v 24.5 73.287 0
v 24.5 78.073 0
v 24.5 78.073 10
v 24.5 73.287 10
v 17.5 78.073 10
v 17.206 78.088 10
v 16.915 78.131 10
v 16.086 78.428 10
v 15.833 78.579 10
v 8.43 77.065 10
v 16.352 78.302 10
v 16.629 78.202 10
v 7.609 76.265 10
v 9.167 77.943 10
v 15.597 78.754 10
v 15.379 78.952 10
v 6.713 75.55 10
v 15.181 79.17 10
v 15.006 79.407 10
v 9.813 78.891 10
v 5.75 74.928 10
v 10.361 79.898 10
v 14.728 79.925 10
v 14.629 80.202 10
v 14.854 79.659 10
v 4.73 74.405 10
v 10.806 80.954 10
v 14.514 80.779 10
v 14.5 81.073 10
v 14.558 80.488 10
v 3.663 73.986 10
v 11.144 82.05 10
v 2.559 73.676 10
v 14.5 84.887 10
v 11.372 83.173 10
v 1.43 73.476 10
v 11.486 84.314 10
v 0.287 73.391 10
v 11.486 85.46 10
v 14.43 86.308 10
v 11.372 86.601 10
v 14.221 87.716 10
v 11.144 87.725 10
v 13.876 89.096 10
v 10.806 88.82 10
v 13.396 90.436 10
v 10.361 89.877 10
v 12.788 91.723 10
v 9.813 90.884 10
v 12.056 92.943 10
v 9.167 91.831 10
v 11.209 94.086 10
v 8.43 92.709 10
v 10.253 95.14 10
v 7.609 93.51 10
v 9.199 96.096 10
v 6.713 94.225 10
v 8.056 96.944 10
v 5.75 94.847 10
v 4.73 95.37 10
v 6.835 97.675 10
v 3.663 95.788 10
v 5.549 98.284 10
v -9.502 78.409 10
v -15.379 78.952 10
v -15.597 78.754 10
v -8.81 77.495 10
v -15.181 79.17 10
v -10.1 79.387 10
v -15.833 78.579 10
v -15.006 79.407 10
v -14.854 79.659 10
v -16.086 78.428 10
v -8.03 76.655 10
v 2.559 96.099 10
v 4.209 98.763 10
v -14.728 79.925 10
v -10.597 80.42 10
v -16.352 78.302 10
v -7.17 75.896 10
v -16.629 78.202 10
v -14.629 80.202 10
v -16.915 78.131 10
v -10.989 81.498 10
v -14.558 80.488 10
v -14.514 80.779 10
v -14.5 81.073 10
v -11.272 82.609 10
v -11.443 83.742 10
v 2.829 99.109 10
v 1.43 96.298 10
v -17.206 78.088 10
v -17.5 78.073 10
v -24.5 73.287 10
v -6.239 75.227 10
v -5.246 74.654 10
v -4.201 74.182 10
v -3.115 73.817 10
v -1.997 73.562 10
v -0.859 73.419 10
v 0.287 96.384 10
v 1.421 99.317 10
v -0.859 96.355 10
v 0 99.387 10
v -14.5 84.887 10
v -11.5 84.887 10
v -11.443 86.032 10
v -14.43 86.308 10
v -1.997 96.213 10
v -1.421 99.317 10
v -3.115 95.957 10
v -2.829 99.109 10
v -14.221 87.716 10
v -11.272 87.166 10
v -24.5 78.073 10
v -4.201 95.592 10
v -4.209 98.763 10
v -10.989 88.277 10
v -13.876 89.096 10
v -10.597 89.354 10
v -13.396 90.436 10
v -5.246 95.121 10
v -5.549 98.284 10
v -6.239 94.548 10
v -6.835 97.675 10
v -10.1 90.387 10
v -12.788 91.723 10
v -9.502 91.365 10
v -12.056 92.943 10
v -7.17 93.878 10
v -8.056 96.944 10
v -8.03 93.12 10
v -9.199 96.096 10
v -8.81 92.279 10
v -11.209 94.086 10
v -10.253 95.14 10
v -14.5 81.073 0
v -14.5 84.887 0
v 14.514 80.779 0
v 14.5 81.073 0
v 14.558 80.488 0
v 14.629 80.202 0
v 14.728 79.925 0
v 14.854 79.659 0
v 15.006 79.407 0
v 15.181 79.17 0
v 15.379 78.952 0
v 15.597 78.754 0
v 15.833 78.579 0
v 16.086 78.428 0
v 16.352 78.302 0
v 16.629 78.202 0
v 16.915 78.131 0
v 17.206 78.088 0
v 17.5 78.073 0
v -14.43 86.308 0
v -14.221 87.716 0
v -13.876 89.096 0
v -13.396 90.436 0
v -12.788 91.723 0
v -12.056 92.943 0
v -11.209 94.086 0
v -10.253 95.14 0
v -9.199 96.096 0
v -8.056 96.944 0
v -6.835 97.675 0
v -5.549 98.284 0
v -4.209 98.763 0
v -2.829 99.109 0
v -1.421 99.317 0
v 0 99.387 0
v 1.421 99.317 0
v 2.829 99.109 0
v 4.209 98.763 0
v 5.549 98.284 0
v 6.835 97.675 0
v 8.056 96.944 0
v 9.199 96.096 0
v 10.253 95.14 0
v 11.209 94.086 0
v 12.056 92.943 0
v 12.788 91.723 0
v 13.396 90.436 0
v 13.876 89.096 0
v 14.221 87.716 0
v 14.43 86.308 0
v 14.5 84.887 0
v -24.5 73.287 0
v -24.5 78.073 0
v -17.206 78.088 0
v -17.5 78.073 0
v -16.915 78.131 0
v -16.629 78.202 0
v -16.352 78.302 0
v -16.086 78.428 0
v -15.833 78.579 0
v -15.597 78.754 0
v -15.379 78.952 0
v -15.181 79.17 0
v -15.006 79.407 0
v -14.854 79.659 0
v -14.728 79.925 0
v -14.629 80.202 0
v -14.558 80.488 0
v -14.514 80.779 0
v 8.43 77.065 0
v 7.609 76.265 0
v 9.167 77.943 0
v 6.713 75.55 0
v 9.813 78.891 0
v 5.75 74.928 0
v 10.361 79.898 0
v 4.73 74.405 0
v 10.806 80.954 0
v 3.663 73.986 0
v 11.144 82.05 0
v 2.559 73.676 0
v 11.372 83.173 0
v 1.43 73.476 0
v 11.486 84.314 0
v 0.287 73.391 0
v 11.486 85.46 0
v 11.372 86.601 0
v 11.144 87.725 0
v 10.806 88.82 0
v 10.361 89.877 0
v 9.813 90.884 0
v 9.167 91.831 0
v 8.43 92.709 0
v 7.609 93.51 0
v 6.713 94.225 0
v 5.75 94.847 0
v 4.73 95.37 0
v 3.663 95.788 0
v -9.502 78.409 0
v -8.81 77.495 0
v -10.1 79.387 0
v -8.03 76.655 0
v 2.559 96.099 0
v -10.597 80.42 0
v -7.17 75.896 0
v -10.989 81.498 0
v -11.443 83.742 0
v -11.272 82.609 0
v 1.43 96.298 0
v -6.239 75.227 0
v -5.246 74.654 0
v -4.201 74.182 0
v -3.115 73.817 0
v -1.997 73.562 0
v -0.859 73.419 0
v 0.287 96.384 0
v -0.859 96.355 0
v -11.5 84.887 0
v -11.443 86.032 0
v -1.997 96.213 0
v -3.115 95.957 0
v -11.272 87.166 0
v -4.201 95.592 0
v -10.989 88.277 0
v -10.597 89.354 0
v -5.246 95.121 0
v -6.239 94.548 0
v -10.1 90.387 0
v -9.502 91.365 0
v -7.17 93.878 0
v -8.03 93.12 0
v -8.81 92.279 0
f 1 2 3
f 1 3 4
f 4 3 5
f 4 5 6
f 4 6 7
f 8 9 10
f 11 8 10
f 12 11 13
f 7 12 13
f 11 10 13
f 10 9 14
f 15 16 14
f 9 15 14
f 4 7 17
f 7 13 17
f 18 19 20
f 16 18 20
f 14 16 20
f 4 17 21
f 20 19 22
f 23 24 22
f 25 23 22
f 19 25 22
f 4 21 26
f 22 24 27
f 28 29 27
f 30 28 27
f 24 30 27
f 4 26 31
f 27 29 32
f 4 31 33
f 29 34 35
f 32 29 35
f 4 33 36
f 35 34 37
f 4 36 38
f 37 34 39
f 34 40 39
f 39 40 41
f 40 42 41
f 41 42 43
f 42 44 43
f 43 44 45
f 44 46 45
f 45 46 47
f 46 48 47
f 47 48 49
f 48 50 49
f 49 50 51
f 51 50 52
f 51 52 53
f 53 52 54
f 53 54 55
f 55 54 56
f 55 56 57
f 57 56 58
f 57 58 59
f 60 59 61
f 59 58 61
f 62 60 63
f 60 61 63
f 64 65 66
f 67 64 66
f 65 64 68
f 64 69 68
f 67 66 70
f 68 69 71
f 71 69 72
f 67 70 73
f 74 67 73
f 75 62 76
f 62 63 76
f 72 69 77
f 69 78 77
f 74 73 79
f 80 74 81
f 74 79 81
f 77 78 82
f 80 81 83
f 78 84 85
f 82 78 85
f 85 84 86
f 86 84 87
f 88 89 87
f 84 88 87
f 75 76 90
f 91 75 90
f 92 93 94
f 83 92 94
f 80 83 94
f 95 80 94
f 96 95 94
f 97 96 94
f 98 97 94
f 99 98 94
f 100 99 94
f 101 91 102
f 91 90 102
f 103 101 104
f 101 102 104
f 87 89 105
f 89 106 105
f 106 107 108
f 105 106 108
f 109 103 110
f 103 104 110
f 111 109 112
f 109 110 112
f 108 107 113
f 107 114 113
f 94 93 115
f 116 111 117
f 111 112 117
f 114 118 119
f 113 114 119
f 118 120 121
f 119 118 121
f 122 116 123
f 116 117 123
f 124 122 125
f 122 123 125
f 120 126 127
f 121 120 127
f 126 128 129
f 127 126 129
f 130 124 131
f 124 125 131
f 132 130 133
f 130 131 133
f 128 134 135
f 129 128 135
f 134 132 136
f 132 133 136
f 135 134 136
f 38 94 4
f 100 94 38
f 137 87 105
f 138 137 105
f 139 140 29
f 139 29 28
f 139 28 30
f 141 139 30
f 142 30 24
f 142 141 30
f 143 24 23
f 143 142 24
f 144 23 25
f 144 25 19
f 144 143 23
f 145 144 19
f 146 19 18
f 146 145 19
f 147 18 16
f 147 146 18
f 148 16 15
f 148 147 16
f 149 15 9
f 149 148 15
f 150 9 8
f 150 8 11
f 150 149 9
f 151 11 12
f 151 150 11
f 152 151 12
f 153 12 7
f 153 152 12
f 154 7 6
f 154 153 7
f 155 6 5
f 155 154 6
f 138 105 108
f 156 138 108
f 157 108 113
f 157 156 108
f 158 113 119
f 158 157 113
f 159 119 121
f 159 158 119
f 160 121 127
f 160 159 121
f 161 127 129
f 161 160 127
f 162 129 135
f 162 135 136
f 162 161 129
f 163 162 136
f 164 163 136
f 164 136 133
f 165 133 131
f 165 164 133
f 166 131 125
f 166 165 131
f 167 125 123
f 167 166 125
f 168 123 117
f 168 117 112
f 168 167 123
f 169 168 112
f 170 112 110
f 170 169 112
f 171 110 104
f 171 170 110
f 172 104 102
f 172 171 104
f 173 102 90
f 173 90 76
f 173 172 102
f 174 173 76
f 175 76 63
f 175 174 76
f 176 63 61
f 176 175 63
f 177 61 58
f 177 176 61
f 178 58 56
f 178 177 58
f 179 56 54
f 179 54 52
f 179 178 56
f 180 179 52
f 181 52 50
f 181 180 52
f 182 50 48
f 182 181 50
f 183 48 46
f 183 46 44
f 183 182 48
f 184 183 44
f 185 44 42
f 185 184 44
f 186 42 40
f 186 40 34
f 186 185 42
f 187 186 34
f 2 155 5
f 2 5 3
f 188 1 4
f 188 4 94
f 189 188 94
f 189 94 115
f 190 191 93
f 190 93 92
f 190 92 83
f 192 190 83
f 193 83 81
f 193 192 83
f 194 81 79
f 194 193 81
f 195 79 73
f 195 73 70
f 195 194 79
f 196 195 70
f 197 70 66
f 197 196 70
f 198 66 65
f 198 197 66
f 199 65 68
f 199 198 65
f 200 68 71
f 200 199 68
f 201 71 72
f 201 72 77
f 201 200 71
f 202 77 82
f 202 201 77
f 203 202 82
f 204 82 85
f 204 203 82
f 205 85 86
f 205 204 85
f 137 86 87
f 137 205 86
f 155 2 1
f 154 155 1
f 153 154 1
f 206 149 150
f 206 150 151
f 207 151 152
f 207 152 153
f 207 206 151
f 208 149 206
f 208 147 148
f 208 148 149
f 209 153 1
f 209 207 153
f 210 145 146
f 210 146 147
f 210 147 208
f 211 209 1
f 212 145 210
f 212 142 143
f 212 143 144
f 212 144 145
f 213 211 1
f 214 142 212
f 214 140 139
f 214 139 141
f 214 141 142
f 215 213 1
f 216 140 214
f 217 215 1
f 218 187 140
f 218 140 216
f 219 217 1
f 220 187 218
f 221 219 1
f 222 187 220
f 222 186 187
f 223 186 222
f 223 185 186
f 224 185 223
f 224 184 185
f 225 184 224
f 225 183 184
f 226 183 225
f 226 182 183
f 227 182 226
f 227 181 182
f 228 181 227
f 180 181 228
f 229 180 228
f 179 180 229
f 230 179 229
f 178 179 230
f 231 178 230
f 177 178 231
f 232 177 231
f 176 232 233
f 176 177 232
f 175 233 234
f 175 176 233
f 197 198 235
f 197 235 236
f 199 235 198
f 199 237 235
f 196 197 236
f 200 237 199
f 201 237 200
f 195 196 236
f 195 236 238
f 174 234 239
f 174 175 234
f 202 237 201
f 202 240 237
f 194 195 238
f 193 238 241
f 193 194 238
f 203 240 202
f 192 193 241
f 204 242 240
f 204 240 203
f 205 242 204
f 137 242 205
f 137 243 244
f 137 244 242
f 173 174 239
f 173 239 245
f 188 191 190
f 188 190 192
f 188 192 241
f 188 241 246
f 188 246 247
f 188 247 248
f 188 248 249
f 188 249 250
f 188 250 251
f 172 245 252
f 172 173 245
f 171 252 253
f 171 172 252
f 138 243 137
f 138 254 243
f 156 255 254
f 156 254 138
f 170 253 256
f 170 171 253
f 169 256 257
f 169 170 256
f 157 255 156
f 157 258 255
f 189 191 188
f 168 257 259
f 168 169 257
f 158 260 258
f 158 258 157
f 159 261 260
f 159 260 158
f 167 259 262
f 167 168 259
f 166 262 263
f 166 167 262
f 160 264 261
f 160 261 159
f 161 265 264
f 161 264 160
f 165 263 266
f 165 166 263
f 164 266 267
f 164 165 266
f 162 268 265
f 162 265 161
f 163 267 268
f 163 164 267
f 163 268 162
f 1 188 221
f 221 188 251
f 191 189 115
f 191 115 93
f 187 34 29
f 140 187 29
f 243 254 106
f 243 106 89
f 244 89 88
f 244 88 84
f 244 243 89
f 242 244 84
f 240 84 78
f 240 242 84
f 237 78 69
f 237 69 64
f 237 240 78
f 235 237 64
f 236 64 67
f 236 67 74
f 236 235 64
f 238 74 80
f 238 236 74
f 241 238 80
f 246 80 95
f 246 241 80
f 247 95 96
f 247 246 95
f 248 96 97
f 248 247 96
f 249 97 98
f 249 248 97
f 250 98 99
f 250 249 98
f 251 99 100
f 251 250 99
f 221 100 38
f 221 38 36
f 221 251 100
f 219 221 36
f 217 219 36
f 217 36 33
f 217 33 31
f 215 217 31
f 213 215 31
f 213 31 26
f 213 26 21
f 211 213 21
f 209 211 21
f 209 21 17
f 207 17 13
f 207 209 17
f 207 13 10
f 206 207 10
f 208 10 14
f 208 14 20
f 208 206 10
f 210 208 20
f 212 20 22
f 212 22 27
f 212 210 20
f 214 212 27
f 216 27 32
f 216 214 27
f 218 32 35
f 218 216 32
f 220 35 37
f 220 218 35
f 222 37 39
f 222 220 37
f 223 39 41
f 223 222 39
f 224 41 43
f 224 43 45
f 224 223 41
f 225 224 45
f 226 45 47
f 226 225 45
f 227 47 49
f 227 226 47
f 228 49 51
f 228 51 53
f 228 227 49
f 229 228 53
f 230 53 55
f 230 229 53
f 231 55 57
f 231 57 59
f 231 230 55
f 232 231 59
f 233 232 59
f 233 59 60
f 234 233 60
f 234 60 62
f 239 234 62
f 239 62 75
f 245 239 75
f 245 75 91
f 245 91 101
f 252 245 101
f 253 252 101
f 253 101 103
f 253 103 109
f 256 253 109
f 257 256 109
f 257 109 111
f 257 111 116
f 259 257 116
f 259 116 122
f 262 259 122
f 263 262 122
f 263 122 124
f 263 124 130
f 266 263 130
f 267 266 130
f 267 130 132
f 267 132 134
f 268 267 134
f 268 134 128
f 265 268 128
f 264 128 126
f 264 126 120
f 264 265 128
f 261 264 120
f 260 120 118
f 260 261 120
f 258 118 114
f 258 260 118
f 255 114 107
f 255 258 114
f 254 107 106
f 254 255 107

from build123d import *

# Parameters (mm, degrees)
BOSS_EXTRUDE1_DEPTH = 10


with BuildPart() as part:
    # Sketch1 → Boss-Extrude1 (new body)
    with BuildSketch(Plane.XY):
        with BuildLine():
            Line((17.5, 78.07327943), (24.5, 78.07327943))
            Line((24.5, 78.07327943), (24.5, 73.287247591))
            Line((24.5, 73.287247591), (-24.5, 73.287247591))
            Line((-24.5, 73.287247591), (-24.5, 78.07327943))
            Line((-24.5, 78.07327943), (-17.5, 78.07327943))
            ThreePointArc((-17.5, 78.07327943), (-15.378679656, 78.951959087), (-14.5, 81.07327943))
            Line((-14.5, 81.07327943), (-14.5, 84.887247591))
            ThreePointArc((-14.5, 84.887247591), (0, 99.387247591), (14.5, 84.887247591))
            Line((14.5, 84.887247591), (14.5, 81.07327943))
            ThreePointArc((14.5, 81.07327943), (15.378679656, 78.951959087), (17.5, 78.07327943))
        make_face()
        with BuildLine():
            ThreePointArc((11.5, 84.887247591), (0, 96.387247591), (-11.5, 84.887247591))
            ThreePointArc((-11.5, 84.887247591), (0, 73.387247591), (11.5, 84.887247591))
        make_face(mode=Mode.SUBTRACT)
    extrude(amount=BOSS_EXTRUDE1_DEPTH)


solid = part.part
